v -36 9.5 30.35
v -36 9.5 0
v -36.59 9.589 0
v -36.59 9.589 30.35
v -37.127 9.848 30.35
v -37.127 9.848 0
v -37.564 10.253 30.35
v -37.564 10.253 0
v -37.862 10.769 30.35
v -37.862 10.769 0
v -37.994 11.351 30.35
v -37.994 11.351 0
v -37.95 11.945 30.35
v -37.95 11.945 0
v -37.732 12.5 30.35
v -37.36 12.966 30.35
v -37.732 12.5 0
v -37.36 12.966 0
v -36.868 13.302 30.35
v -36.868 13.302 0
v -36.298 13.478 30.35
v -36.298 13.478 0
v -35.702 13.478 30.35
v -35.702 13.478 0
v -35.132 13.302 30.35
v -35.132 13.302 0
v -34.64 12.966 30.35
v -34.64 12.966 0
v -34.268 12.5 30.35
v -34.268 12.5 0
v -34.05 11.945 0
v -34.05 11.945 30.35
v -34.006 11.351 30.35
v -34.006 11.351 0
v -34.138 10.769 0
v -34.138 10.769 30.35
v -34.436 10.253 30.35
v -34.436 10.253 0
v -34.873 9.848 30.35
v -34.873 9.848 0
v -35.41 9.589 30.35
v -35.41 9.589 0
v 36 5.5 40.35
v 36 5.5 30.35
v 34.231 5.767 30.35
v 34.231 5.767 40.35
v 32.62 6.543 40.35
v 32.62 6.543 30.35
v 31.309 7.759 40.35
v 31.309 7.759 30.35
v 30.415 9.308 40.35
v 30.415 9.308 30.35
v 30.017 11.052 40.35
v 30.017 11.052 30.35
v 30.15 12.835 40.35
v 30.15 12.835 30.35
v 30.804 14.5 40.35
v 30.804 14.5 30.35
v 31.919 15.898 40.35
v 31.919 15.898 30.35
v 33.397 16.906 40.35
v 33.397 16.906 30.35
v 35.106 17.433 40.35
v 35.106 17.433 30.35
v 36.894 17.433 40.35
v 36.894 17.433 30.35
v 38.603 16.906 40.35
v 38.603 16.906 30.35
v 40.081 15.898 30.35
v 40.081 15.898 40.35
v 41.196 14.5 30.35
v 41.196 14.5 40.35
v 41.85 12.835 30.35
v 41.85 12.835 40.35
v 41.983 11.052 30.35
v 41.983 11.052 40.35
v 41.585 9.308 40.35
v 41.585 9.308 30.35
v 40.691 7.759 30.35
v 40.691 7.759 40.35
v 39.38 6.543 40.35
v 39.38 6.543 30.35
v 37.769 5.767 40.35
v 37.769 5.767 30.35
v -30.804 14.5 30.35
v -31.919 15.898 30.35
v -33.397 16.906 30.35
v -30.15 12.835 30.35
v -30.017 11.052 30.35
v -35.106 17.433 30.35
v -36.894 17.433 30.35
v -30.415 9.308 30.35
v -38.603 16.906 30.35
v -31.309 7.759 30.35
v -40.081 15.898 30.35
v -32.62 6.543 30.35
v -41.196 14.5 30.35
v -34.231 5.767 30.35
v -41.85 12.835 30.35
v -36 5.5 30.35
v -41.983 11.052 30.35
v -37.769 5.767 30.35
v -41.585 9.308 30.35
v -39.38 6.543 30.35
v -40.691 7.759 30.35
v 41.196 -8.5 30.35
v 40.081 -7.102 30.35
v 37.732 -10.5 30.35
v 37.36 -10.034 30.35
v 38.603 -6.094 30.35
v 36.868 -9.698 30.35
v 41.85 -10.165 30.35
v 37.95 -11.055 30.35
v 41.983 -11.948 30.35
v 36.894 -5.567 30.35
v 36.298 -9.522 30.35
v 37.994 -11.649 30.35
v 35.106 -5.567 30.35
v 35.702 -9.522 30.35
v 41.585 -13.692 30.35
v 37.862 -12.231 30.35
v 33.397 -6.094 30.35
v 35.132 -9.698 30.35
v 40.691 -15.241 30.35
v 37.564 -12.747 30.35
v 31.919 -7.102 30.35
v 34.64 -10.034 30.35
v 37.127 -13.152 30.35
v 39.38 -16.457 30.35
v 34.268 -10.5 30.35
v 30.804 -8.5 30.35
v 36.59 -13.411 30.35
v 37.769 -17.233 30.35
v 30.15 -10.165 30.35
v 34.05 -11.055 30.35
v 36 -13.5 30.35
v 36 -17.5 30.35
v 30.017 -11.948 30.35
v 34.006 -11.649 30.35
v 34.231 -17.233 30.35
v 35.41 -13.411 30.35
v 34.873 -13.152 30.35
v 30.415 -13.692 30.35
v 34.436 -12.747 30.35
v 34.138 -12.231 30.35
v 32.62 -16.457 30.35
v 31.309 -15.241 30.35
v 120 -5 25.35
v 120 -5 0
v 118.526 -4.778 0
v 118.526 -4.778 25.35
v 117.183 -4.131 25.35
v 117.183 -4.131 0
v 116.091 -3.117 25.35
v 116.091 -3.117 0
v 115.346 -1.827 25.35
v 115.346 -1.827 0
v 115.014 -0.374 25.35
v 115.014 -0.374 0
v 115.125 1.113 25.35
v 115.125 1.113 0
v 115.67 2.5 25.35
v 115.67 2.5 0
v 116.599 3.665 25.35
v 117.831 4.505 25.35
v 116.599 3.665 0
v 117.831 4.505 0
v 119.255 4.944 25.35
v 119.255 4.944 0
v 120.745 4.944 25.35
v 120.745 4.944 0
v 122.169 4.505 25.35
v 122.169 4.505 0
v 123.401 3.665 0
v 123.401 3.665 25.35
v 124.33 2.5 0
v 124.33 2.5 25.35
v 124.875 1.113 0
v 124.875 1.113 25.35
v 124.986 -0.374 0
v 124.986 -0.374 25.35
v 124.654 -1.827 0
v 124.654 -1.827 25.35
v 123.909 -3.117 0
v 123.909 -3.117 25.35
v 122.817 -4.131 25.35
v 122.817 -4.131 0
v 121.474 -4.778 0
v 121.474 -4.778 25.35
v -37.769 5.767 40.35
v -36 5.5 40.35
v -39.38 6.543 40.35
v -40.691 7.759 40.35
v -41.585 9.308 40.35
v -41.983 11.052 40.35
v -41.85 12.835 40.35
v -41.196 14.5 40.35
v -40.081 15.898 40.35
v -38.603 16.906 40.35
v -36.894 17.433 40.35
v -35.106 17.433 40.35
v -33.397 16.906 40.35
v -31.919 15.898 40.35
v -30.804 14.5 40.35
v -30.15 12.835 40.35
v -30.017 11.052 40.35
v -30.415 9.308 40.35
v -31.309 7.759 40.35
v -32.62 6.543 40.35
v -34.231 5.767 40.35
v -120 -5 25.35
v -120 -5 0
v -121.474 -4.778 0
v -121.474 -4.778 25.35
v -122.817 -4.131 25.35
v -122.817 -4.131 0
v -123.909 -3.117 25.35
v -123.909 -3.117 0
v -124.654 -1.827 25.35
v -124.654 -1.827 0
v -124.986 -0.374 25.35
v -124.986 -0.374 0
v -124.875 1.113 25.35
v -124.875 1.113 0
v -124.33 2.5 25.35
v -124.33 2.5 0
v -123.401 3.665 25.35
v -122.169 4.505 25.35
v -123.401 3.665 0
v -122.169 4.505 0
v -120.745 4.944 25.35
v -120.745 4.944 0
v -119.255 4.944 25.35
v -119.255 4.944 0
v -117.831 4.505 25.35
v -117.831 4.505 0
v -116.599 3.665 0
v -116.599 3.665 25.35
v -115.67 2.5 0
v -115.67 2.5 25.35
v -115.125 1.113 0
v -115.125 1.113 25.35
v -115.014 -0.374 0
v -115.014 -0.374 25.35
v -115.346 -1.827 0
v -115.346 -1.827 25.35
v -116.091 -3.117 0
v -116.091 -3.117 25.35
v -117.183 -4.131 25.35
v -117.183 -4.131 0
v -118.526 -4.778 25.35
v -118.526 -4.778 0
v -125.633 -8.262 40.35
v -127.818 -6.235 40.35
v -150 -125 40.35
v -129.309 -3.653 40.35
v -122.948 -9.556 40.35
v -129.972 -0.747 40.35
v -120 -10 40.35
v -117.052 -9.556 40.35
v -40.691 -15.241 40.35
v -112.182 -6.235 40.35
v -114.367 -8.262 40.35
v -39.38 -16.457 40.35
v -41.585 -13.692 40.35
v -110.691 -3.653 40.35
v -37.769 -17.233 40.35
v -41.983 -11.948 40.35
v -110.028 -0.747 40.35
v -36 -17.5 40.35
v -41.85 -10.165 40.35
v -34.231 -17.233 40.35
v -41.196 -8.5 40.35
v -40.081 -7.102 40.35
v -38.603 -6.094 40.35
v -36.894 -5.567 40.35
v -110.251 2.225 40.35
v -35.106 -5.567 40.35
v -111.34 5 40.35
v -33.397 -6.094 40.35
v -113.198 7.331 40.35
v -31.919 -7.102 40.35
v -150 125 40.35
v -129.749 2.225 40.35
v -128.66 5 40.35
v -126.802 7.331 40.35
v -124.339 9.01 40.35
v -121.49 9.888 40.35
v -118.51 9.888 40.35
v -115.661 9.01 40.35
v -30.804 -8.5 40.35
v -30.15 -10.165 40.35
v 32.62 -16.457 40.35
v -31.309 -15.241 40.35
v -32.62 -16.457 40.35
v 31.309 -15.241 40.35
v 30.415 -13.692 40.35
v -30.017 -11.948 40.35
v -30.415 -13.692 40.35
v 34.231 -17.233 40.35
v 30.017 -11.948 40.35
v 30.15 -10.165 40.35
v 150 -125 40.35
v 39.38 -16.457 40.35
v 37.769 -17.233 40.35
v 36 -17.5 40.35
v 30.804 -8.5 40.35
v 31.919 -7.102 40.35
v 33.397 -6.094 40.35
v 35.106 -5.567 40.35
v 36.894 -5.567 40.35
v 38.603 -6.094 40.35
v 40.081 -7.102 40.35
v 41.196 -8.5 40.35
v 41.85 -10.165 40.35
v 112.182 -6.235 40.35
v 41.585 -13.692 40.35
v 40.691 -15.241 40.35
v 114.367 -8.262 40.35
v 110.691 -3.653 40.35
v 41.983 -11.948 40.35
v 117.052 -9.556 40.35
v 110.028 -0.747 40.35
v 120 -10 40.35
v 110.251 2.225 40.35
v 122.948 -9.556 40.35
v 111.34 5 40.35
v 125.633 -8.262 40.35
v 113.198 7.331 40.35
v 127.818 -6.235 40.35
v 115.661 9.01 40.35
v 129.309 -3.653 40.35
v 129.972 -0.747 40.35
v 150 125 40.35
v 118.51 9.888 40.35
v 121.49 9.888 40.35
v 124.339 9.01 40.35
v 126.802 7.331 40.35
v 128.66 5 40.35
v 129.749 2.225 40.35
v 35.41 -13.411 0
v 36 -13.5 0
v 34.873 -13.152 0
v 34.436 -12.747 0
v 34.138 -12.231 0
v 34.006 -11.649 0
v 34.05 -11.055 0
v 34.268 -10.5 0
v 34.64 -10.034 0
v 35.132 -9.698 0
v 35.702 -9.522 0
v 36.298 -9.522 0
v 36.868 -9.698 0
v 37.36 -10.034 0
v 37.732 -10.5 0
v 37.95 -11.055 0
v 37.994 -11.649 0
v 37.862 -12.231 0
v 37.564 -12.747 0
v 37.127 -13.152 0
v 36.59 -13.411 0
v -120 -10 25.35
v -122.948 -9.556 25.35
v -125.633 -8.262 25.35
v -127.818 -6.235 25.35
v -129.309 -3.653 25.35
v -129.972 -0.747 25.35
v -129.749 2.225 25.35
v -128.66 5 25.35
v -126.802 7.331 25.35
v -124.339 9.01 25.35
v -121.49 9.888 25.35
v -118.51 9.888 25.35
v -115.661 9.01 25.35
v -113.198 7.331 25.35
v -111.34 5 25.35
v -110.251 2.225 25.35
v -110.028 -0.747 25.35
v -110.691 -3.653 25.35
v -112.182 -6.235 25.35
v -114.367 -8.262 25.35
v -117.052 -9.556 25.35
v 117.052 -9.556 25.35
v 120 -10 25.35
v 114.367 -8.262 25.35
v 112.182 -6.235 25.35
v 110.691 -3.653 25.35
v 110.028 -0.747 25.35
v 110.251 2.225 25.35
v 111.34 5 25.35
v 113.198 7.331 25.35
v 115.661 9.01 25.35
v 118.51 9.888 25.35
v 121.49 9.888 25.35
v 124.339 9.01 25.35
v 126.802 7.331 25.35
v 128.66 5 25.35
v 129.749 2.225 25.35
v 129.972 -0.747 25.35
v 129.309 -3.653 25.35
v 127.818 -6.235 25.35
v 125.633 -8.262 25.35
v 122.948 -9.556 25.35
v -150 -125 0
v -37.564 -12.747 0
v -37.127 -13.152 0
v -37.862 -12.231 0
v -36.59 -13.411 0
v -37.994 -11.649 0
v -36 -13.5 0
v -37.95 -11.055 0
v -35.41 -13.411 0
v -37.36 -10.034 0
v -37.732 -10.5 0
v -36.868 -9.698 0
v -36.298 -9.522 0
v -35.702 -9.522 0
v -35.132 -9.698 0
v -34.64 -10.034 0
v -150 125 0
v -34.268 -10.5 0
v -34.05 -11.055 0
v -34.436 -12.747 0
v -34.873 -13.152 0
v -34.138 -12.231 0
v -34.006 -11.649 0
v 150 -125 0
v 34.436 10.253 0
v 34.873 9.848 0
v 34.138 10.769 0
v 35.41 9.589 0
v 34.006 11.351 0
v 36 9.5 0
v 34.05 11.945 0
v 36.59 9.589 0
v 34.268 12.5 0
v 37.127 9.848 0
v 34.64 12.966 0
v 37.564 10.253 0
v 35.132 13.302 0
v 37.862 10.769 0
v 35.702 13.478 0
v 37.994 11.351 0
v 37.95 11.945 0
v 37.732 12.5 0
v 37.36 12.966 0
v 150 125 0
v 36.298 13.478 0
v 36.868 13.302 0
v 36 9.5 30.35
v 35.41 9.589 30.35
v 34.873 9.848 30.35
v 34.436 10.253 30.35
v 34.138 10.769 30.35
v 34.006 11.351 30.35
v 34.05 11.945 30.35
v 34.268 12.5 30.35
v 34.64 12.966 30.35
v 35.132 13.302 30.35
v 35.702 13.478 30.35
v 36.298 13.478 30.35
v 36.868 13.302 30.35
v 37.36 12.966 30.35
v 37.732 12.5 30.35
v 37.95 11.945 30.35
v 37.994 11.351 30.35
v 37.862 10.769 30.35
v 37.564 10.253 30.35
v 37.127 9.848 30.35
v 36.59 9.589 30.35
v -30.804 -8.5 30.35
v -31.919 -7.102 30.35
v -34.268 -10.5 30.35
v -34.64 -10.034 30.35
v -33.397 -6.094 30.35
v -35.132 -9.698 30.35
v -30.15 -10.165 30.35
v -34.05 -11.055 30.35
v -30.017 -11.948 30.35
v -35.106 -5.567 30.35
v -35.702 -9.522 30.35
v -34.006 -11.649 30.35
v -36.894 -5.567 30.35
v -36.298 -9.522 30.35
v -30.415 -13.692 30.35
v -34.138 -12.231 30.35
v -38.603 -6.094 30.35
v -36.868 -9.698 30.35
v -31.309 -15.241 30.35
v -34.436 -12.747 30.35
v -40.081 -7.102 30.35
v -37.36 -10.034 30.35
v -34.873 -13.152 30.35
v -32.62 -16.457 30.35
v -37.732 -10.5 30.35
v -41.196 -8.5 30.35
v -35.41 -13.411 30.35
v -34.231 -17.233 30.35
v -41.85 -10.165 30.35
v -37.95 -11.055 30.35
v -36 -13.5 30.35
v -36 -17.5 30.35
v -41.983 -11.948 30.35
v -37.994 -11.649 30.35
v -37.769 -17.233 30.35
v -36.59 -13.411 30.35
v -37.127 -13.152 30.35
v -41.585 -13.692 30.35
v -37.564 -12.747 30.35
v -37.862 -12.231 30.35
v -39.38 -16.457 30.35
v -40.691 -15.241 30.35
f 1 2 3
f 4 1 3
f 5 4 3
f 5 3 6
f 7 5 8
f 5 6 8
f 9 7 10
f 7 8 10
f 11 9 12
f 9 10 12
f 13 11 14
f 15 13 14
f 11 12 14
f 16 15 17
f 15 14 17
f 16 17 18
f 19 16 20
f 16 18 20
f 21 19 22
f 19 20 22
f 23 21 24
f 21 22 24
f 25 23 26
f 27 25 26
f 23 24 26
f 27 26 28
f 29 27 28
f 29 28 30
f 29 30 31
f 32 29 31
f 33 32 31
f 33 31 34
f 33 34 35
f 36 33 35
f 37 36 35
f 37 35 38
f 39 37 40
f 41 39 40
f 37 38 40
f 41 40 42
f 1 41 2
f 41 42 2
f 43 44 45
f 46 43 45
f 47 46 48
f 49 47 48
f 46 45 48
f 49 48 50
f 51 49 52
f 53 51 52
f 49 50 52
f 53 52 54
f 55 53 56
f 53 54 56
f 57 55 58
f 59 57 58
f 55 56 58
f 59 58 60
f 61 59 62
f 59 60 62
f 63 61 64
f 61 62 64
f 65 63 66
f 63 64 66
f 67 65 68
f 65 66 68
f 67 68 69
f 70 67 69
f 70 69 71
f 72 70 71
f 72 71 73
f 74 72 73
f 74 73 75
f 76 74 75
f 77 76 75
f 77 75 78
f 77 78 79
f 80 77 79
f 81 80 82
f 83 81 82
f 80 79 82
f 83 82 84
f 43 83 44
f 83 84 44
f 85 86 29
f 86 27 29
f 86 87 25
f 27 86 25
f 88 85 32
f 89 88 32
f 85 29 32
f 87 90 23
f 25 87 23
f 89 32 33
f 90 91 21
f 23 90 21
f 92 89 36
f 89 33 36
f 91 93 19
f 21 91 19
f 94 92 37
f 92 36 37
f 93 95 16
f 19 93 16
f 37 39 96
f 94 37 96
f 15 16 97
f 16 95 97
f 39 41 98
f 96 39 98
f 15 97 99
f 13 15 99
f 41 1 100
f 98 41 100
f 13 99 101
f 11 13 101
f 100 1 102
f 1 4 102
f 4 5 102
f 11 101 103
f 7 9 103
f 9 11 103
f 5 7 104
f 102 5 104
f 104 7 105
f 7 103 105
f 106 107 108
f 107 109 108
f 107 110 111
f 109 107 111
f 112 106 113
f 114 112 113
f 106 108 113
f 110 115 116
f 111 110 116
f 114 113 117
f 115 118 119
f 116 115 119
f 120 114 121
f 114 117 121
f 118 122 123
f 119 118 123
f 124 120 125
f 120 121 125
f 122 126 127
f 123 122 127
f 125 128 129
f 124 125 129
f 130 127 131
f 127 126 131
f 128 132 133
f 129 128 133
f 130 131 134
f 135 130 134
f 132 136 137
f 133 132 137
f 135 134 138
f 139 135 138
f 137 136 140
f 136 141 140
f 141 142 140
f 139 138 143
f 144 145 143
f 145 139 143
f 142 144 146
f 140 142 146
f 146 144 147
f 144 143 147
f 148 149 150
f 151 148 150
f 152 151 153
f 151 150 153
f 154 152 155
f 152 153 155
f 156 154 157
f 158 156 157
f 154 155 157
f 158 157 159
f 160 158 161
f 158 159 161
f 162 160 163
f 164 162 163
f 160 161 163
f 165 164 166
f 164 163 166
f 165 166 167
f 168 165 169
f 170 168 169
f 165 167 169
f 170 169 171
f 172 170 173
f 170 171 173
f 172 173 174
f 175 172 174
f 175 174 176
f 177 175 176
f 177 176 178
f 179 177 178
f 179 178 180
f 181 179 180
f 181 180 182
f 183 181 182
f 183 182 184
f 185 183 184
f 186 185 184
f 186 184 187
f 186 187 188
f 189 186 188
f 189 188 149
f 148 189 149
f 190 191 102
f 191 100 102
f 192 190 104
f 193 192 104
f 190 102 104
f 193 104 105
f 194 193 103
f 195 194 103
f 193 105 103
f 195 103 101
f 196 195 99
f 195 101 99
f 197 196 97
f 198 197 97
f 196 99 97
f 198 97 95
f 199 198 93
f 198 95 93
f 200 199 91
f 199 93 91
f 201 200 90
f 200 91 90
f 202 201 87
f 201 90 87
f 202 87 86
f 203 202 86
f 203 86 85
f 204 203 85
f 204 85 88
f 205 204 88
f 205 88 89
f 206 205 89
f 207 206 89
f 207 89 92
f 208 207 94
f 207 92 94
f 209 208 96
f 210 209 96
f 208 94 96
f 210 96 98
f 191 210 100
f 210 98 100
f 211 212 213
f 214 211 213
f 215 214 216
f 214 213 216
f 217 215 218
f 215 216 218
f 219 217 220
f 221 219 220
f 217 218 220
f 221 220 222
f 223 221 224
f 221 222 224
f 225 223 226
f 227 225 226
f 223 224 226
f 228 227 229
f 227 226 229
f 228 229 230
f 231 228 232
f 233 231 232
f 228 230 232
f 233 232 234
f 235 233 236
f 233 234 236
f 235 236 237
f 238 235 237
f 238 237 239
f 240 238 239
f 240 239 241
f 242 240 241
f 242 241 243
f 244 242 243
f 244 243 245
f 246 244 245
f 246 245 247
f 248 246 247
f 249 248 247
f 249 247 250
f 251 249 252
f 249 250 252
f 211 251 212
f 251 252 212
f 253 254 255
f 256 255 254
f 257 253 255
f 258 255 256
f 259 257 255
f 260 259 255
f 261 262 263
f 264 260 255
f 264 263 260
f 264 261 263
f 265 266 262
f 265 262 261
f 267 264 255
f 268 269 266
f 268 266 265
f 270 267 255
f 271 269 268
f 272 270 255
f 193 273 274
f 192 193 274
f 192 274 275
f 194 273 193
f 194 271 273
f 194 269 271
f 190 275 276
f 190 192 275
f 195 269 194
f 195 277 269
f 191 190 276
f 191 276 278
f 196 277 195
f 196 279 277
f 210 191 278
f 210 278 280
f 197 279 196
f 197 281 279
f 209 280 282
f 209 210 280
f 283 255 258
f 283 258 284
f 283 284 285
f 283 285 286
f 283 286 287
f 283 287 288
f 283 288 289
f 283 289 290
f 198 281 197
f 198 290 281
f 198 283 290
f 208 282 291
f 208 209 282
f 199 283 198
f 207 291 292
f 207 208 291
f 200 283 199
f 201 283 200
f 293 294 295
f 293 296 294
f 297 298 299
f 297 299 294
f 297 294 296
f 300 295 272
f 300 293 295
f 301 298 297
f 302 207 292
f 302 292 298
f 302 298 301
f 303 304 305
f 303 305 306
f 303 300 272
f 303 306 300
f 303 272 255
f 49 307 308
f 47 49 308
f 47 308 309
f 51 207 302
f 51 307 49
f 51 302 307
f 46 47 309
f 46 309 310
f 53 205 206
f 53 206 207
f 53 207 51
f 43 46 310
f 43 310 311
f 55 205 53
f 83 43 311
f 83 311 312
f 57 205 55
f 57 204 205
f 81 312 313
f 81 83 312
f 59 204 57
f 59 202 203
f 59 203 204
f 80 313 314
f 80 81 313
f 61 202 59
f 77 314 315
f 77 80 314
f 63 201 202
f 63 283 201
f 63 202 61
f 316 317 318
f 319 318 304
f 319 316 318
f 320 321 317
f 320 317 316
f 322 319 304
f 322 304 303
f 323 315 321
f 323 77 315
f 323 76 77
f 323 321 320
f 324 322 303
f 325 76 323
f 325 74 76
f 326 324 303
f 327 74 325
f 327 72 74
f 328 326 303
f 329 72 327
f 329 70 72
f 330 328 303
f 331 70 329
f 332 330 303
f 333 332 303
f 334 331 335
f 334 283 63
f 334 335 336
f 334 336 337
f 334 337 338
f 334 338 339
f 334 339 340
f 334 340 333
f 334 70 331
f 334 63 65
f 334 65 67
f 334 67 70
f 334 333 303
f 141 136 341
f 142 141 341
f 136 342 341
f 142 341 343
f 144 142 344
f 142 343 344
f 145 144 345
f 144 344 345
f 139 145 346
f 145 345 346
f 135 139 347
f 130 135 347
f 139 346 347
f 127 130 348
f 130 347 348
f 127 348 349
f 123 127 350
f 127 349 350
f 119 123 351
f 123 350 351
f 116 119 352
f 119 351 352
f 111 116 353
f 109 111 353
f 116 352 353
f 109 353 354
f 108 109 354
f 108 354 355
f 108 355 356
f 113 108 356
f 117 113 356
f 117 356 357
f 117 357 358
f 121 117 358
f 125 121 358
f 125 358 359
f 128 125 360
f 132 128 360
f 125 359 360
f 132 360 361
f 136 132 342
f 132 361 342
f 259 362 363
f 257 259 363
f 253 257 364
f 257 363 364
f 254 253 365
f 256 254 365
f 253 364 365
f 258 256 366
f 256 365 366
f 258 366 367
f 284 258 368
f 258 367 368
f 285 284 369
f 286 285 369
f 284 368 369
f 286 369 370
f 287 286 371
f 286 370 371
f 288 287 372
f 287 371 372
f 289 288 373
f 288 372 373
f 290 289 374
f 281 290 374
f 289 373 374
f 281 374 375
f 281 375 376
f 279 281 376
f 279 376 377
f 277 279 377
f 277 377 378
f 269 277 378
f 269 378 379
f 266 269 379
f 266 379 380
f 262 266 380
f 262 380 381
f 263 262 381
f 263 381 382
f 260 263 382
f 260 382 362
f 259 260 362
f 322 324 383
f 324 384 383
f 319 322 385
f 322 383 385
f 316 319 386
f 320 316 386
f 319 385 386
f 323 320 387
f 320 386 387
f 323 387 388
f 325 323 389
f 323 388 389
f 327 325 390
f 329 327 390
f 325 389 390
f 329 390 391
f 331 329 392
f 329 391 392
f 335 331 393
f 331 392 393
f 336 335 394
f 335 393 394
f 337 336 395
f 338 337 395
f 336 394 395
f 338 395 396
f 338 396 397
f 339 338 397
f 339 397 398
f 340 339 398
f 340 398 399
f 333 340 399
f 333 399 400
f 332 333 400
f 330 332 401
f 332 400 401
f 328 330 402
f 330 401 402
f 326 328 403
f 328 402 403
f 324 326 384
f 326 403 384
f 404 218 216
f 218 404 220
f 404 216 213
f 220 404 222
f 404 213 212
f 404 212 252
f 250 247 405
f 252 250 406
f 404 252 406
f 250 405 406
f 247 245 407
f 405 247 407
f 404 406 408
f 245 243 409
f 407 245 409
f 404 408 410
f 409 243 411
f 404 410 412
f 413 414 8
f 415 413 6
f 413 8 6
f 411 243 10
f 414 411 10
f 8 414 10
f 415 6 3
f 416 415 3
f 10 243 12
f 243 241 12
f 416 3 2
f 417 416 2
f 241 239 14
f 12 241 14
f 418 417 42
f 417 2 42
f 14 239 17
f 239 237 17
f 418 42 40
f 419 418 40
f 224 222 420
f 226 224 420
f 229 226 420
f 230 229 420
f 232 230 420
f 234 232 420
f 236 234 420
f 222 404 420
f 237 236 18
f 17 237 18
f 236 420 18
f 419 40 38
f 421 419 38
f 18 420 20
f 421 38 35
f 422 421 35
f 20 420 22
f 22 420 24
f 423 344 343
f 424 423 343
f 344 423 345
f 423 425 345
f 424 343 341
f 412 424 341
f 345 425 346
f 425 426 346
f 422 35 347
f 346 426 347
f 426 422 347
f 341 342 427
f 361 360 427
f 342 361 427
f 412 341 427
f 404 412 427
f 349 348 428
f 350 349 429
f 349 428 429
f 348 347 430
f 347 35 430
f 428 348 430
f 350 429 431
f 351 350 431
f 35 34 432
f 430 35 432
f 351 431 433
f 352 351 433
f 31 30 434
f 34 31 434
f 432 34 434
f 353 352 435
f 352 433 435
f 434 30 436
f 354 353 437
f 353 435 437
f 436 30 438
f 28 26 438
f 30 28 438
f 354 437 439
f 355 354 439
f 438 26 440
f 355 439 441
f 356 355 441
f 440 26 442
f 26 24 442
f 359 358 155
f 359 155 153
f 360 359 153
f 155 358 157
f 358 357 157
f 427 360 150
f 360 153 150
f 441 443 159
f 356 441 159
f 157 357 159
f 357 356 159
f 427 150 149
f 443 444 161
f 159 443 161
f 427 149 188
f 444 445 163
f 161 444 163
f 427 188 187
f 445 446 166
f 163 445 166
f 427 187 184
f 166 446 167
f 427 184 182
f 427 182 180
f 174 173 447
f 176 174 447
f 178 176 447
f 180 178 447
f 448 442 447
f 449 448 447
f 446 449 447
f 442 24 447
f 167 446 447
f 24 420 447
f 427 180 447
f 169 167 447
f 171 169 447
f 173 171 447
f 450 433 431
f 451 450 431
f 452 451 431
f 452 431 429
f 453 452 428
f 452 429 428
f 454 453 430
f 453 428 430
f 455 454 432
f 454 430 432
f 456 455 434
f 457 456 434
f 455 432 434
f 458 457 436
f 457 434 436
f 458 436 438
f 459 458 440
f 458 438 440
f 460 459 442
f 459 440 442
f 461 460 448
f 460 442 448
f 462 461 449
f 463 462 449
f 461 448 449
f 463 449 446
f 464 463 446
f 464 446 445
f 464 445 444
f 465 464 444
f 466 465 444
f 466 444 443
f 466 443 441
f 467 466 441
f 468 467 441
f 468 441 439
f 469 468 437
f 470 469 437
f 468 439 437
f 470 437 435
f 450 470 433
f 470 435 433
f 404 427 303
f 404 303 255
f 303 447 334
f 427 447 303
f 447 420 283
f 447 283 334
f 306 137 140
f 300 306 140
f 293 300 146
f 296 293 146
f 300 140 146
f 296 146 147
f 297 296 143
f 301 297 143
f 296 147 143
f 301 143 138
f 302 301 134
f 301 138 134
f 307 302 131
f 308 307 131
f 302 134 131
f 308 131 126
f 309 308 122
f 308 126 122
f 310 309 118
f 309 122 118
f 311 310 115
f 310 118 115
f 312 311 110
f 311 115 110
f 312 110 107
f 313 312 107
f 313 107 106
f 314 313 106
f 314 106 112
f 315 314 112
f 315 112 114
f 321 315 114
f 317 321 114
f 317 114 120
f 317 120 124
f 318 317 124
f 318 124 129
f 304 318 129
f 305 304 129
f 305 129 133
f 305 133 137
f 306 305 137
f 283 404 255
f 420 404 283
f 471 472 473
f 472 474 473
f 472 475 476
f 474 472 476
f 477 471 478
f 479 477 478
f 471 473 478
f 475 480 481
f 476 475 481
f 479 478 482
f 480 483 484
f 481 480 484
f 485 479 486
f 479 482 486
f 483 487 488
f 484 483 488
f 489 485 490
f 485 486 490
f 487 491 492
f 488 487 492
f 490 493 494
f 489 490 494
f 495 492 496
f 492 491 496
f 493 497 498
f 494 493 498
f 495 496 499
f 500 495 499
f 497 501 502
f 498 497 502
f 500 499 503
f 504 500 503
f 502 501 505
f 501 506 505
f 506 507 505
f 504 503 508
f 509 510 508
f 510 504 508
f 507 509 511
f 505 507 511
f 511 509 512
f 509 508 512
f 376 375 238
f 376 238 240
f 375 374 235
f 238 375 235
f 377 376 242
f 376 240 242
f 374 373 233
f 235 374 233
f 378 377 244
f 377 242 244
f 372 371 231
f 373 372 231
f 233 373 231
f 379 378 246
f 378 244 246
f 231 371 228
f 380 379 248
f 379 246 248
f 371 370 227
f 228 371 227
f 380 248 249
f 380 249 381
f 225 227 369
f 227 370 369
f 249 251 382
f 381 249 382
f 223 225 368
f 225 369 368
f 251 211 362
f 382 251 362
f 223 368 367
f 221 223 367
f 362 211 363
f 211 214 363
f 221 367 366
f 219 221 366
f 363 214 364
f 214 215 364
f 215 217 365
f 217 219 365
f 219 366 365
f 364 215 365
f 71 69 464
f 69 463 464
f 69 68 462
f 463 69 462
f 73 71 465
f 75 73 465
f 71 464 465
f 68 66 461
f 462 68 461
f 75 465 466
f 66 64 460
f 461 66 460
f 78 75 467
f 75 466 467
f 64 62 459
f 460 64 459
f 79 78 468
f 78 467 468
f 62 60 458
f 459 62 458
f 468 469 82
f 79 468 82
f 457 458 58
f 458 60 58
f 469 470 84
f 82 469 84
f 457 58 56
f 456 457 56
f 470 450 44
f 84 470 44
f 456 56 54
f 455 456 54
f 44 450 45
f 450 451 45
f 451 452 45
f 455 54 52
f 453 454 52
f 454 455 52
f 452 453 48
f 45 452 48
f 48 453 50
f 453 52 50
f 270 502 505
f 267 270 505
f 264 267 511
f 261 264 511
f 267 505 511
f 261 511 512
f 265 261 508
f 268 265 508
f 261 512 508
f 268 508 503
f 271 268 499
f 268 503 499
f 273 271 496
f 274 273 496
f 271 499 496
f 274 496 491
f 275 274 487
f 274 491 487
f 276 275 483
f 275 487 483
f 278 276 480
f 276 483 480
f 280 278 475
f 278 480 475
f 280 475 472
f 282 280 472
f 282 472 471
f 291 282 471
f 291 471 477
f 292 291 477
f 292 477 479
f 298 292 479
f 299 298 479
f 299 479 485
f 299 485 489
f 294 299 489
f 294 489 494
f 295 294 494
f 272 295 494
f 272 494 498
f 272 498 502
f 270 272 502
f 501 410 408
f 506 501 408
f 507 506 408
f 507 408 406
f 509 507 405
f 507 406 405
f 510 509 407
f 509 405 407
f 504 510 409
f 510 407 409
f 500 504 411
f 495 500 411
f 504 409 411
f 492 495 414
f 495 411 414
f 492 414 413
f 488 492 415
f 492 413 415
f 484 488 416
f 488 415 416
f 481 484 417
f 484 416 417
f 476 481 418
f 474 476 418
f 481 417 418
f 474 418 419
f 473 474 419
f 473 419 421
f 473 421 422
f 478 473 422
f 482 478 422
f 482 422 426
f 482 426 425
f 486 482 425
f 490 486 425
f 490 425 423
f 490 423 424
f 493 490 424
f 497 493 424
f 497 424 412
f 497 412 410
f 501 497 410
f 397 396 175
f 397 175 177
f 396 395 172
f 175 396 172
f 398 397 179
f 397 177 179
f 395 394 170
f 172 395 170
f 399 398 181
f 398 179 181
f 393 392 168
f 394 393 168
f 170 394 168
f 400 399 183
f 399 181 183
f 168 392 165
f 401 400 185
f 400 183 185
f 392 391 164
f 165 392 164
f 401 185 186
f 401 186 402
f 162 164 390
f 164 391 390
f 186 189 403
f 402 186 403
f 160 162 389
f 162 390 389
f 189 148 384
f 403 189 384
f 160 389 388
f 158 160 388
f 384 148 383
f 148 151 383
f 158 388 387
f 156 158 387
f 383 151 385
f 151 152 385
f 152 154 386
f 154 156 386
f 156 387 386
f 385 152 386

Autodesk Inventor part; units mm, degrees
ref_plane "YZ Plane" through (0, 0, 0) normal (1, 0, 0) x (0, 1, 0)
ref_plane "XZ Plane" through (0, 0, 0) normal (0, 1, 0) x (-1, 0, 0)
ref_plane "XY Plane" through (0, 0, 0) normal (0, 0, 1) x (1, 0, 0)
sketch "Sketch1" plane through (0, 0, 0) normal (0, 0, 1) x (1, 0, 0)
  line L0 (-150, 125) -> (150, 125)
  line L1 (150, 125) -> (150, -125)
  line L2 (150, -125) -> (-150, -125)
  line L3 (-150, -125) -> (-150, 125)
  point P0 (0, 0)
  point P1 (0, 125)
  point P2 (150, 0)
  dimension "d0" = 300
  dimension "d1" = 250
extrude "Extrusion1" add sketch "Sketch1" along normal blind 40.35
sketch "Sketch2" plane through (0, 0, 40.35) normal (0, 0, 1) x (1, 0, 0)
  circle A0 centre (-120, 0) radius 5
  line L0 (150, 125) -> (-150, 125) construction
  line L1 (0, 125) -> (0, -125) construction
  line L2 (-150, -125) -> (150, -125) construction
  circle A1 centre (120, 0) radius 5
  point P0 (0, 0)
  dimension "d4" = 10
  dimension "d5" = 120
hole "Hole1" at (-120, 0, 40.35) at (120, 0, 40.35) direction (0, 0, -1) diameter 10 end through all counterbore diameter 20 counterbore depth 15
sketch "Sketch4" plane through (0, 0, 40.35) normal (0, 0, 1) x (1, 0, 0)
  circle A0 centre (-36, 11.5) radius 2
  line L0 (150, 125) -> (-150, 125) construction
  line L1 (0, 125) -> (0, -125) construction
  line L2 (-150, -125) -> (150, -125) construction
  line L3 (150, -125) -> (150, 125) construction
  line L4 (150, 0) -> (-150, 0) construction
  line L5 (-150, 125) -> (-150, -125) construction
  circle A1 centre (-36, -11.5) radius 2
  line L6 (0, -125) -> (0, 125) construction
  circle A2 centre (36, 11.5) radius 2
  circle A3 centre (36, -11.5) radius 2
  point P0 (0, 0)
  dimension "d13" = 4
  dimension "d14" = 11.5
  dimension "d15" = 36
hole "Hole2" at (-36, 11.5, 40.35) at (36, 11.5, 40.35) at (36, -11.5, 40.35) at (-36, -11.5, 40.35) direction (0, 0, -1) diameter 4 end through all counterbore diameter 12 counterbore depth 10
properties part number "base de madera grande"
